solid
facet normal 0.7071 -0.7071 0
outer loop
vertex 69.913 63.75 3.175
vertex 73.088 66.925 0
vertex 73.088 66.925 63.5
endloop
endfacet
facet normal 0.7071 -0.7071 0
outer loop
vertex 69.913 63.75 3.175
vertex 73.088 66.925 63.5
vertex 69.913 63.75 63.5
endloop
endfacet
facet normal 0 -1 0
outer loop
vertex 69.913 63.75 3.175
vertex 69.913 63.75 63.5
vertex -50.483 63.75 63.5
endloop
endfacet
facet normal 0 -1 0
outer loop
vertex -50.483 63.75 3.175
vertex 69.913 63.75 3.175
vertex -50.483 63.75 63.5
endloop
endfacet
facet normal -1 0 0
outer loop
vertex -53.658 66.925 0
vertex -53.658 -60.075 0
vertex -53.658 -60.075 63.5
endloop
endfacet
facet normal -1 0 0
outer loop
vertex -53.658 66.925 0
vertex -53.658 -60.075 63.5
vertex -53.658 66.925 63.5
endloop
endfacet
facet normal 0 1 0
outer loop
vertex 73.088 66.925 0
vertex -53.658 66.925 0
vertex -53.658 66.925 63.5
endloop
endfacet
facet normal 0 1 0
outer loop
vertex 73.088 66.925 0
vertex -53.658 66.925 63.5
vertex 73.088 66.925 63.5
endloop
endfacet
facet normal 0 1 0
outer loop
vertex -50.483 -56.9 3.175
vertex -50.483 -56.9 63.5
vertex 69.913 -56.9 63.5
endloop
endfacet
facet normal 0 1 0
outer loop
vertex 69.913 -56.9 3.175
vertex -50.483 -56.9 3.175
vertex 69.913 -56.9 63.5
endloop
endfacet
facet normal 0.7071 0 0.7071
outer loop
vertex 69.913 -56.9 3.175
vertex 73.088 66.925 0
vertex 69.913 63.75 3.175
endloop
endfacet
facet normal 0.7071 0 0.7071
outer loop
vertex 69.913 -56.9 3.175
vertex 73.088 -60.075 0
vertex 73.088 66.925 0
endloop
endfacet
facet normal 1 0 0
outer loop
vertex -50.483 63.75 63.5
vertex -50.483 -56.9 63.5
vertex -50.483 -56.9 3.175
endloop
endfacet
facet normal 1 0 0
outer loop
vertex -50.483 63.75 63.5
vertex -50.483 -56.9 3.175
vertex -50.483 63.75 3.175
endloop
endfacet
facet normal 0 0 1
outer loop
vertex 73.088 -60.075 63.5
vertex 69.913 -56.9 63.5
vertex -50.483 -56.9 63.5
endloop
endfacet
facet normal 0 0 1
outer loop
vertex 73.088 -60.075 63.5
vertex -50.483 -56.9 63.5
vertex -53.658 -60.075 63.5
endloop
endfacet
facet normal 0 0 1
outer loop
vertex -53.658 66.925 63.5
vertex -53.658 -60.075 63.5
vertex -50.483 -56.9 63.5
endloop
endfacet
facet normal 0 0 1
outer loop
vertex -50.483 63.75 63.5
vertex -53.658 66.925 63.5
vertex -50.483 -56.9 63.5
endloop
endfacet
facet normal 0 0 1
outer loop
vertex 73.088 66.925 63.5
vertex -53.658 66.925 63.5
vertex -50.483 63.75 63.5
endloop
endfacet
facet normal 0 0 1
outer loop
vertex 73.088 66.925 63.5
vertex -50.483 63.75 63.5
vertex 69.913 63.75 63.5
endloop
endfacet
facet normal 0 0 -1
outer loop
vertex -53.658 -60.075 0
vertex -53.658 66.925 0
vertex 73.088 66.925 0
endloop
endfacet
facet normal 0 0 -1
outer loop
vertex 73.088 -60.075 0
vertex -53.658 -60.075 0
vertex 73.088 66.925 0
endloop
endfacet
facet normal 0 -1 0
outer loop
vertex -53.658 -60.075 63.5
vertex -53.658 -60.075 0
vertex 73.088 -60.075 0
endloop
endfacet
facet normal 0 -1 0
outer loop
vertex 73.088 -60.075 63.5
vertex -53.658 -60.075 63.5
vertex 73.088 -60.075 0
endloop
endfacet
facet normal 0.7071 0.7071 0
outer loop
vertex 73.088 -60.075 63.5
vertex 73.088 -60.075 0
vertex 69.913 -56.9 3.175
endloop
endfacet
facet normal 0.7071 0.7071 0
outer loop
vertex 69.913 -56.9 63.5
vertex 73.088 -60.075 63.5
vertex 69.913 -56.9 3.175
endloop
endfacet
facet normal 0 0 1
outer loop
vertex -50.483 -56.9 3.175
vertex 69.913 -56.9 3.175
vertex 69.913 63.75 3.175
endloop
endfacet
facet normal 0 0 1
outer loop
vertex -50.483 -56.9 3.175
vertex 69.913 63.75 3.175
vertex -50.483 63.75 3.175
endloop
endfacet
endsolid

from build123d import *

# Parameters (mm, degrees)
F0_W         = 127
F0_H         = 127
F1_DEPTH     = 63.5
F2_W         = 120.65
F2_H         = 120.65
F2_W_2       = 40.16652188
F3_DEPTH     = 60.325
F4_T1_DEPTH  = 69.1433009657
F4_T3_DEPTH  = 120.65
F4_T9_DEPTH  = 129.4683009657
F4_T15_DEPTH = 69.1433009657
F4_T24_DEPTH = 69.1433009657
F4_T30_DEPTH = 129.4683009657


# Not quite as in the source:
# - a fillet or chamfer that OpenCascade refuses, or shapes differently, is made with other operations: its cross-section is extruded or revolved along the edge and cut away or added


with BuildPart() as f1:
    # F0 (on Top) → F1 (new body)
    with BuildSketch(Plane.XY):
        with Locations((9.8422262818, 3.4245376295)):
            Rectangle(F0_W, F0_H)
    extrude(amount=F1_DEPTH)

    # F2 (on face) → F3 (cut)
    with BuildSketch(Plane.XY.offset(63.5)):
        with Locations((9.8422262818, 3.4245376295)):
            Rectangle(F2_W, F2_H)
        with Locations((90.2504872218, 3.4245376295)):
            Rectangle(F2_W_2, F2_H)
    extrude(amount=-F3_DEPTH, mode=Mode.SUBTRACT)

    # F4: chamfer of 3.429 on 3 edges, made by hand

    # F4_s2 → F4_t1 (cut)
    with BuildSketch(Plane.XY.offset(3.175)):
        Polygon((73.3422262818, -60.3294623705), (69.9132262818, -56.9004623705), (73.3422262818, -56.9004623705), align=None)
        Polygon((73.3422262818, 67.1785376295), (69.9132262818, 63.7495376295), (73.3422262818, 63.7495376295), align=None)
    extrude(amount=F4_T1_DEPTH, mode=Mode.SUBTRACT)

    # F4_s4 → F4_t3 (cut)
    with BuildSketch(Plane.XZ.offset(-63.7495376295)):
        Polygon((73.3422262818, -0.254), (69.9132262818, 3.175), (73.3422262818, 3.175), align=None)
    extrude(amount=F4_T3_DEPTH, mode=Mode.SUBTRACT)


with BuildPart() as f4_tool7:
    # F4_s8 → F4_t9 (new body)
    with BuildSketch(Plane.XZ.offset(65.7187633362)):
        Polygon((73.3422262818, -0.254), (69.9132262818, 3.175), (73.3422262818, 3.175), align=None)
    extrude(amount=-F4_T9_DEPTH)

    split(bisect_by=Plane.XZ.offset(60.0754623705), keep=Keep.BOTTOM)

    split(bisect_by=Plane.XY, keep=Keep.TOP)

    split(bisect_by=Plane.XZ.offset(56.9004623705), keep=Keep.TOP)


with BuildPart() as f4_tool13:
    # F4_s14 → F4_t15 (new body)
    with BuildSketch(Plane.XY.offset(-5.6433009657)):
        Polygon((73.3422262818, -60.3294623705), (69.9132262818, -56.9004623705), (73.3422262818, -56.9004623705), align=None)
    extrude(amount=F4_T15_DEPTH)

    split(bisect_by=Plane.XZ.offset(60.0754623705), keep=Keep.BOTTOM)

    split(bisect_by=Plane.XY, keep=Keep.TOP)

    split(bisect_by=Plane.XY.offset(3.175), keep=Keep.BOTTOM)


with BuildPart() as f4_tool7_1:
    add(f4_tool7.part)

    # F4_t19: intersect F4_tool13
    add(f4_tool13.part, mode=Mode.INTERSECT)


with BuildPart() as f1_1:
    add(f1.part)

    # F4_t5: cut F4_tool7
    add(f4_tool7_1.part, mode=Mode.SUBTRACT)


with BuildPart() as f4_tool22:
    # F4_s23 → F4_t24 (new body)
    with BuildSketch(Plane.XY.offset(63.5)):
        Polygon((73.3422262818, 67.1785376295), (69.9132262818, 63.7495376295), (73.3422262818, 63.7495376295), align=None)
    extrude(amount=-F4_T24_DEPTH)

    split(bisect_by=Plane.XY, keep=Keep.TOP)

    split(bisect_by=Plane.XZ.offset(-66.9245376295), keep=Keep.TOP)

    split(bisect_by=Plane.XY.offset(3.175), keep=Keep.BOTTOM)


with BuildPart() as f4_tool28:
    # F4_s29 → F4_t30 (new body)
    with BuildSketch(Plane.XZ.offset(56.9004623705)):
        Polygon((73.3422262818, -0.254), (69.9132262818, 3.175), (73.3422262818, 3.175), align=None)
    extrude(amount=-F4_T30_DEPTH)

    split(bisect_by=Plane.XY, keep=Keep.TOP)

    split(bisect_by=Plane.XZ.offset(-66.9245376295), keep=Keep.TOP)

    split(bisect_by=Plane.XZ.offset(-63.7495376295), keep=Keep.BOTTOM)


with BuildPart() as f4_tool22_1:
    add(f4_tool22.part)

    # F4_t34: intersect F4_tool28
    add(f4_tool28.part, mode=Mode.INTERSECT)


with BuildPart() as f1_2:
    add(f1_1.part)

    # F4_t20: cut F4_tool22
    add(f4_tool22_1.part, mode=Mode.SUBTRACT)


solid = f1_2.part
